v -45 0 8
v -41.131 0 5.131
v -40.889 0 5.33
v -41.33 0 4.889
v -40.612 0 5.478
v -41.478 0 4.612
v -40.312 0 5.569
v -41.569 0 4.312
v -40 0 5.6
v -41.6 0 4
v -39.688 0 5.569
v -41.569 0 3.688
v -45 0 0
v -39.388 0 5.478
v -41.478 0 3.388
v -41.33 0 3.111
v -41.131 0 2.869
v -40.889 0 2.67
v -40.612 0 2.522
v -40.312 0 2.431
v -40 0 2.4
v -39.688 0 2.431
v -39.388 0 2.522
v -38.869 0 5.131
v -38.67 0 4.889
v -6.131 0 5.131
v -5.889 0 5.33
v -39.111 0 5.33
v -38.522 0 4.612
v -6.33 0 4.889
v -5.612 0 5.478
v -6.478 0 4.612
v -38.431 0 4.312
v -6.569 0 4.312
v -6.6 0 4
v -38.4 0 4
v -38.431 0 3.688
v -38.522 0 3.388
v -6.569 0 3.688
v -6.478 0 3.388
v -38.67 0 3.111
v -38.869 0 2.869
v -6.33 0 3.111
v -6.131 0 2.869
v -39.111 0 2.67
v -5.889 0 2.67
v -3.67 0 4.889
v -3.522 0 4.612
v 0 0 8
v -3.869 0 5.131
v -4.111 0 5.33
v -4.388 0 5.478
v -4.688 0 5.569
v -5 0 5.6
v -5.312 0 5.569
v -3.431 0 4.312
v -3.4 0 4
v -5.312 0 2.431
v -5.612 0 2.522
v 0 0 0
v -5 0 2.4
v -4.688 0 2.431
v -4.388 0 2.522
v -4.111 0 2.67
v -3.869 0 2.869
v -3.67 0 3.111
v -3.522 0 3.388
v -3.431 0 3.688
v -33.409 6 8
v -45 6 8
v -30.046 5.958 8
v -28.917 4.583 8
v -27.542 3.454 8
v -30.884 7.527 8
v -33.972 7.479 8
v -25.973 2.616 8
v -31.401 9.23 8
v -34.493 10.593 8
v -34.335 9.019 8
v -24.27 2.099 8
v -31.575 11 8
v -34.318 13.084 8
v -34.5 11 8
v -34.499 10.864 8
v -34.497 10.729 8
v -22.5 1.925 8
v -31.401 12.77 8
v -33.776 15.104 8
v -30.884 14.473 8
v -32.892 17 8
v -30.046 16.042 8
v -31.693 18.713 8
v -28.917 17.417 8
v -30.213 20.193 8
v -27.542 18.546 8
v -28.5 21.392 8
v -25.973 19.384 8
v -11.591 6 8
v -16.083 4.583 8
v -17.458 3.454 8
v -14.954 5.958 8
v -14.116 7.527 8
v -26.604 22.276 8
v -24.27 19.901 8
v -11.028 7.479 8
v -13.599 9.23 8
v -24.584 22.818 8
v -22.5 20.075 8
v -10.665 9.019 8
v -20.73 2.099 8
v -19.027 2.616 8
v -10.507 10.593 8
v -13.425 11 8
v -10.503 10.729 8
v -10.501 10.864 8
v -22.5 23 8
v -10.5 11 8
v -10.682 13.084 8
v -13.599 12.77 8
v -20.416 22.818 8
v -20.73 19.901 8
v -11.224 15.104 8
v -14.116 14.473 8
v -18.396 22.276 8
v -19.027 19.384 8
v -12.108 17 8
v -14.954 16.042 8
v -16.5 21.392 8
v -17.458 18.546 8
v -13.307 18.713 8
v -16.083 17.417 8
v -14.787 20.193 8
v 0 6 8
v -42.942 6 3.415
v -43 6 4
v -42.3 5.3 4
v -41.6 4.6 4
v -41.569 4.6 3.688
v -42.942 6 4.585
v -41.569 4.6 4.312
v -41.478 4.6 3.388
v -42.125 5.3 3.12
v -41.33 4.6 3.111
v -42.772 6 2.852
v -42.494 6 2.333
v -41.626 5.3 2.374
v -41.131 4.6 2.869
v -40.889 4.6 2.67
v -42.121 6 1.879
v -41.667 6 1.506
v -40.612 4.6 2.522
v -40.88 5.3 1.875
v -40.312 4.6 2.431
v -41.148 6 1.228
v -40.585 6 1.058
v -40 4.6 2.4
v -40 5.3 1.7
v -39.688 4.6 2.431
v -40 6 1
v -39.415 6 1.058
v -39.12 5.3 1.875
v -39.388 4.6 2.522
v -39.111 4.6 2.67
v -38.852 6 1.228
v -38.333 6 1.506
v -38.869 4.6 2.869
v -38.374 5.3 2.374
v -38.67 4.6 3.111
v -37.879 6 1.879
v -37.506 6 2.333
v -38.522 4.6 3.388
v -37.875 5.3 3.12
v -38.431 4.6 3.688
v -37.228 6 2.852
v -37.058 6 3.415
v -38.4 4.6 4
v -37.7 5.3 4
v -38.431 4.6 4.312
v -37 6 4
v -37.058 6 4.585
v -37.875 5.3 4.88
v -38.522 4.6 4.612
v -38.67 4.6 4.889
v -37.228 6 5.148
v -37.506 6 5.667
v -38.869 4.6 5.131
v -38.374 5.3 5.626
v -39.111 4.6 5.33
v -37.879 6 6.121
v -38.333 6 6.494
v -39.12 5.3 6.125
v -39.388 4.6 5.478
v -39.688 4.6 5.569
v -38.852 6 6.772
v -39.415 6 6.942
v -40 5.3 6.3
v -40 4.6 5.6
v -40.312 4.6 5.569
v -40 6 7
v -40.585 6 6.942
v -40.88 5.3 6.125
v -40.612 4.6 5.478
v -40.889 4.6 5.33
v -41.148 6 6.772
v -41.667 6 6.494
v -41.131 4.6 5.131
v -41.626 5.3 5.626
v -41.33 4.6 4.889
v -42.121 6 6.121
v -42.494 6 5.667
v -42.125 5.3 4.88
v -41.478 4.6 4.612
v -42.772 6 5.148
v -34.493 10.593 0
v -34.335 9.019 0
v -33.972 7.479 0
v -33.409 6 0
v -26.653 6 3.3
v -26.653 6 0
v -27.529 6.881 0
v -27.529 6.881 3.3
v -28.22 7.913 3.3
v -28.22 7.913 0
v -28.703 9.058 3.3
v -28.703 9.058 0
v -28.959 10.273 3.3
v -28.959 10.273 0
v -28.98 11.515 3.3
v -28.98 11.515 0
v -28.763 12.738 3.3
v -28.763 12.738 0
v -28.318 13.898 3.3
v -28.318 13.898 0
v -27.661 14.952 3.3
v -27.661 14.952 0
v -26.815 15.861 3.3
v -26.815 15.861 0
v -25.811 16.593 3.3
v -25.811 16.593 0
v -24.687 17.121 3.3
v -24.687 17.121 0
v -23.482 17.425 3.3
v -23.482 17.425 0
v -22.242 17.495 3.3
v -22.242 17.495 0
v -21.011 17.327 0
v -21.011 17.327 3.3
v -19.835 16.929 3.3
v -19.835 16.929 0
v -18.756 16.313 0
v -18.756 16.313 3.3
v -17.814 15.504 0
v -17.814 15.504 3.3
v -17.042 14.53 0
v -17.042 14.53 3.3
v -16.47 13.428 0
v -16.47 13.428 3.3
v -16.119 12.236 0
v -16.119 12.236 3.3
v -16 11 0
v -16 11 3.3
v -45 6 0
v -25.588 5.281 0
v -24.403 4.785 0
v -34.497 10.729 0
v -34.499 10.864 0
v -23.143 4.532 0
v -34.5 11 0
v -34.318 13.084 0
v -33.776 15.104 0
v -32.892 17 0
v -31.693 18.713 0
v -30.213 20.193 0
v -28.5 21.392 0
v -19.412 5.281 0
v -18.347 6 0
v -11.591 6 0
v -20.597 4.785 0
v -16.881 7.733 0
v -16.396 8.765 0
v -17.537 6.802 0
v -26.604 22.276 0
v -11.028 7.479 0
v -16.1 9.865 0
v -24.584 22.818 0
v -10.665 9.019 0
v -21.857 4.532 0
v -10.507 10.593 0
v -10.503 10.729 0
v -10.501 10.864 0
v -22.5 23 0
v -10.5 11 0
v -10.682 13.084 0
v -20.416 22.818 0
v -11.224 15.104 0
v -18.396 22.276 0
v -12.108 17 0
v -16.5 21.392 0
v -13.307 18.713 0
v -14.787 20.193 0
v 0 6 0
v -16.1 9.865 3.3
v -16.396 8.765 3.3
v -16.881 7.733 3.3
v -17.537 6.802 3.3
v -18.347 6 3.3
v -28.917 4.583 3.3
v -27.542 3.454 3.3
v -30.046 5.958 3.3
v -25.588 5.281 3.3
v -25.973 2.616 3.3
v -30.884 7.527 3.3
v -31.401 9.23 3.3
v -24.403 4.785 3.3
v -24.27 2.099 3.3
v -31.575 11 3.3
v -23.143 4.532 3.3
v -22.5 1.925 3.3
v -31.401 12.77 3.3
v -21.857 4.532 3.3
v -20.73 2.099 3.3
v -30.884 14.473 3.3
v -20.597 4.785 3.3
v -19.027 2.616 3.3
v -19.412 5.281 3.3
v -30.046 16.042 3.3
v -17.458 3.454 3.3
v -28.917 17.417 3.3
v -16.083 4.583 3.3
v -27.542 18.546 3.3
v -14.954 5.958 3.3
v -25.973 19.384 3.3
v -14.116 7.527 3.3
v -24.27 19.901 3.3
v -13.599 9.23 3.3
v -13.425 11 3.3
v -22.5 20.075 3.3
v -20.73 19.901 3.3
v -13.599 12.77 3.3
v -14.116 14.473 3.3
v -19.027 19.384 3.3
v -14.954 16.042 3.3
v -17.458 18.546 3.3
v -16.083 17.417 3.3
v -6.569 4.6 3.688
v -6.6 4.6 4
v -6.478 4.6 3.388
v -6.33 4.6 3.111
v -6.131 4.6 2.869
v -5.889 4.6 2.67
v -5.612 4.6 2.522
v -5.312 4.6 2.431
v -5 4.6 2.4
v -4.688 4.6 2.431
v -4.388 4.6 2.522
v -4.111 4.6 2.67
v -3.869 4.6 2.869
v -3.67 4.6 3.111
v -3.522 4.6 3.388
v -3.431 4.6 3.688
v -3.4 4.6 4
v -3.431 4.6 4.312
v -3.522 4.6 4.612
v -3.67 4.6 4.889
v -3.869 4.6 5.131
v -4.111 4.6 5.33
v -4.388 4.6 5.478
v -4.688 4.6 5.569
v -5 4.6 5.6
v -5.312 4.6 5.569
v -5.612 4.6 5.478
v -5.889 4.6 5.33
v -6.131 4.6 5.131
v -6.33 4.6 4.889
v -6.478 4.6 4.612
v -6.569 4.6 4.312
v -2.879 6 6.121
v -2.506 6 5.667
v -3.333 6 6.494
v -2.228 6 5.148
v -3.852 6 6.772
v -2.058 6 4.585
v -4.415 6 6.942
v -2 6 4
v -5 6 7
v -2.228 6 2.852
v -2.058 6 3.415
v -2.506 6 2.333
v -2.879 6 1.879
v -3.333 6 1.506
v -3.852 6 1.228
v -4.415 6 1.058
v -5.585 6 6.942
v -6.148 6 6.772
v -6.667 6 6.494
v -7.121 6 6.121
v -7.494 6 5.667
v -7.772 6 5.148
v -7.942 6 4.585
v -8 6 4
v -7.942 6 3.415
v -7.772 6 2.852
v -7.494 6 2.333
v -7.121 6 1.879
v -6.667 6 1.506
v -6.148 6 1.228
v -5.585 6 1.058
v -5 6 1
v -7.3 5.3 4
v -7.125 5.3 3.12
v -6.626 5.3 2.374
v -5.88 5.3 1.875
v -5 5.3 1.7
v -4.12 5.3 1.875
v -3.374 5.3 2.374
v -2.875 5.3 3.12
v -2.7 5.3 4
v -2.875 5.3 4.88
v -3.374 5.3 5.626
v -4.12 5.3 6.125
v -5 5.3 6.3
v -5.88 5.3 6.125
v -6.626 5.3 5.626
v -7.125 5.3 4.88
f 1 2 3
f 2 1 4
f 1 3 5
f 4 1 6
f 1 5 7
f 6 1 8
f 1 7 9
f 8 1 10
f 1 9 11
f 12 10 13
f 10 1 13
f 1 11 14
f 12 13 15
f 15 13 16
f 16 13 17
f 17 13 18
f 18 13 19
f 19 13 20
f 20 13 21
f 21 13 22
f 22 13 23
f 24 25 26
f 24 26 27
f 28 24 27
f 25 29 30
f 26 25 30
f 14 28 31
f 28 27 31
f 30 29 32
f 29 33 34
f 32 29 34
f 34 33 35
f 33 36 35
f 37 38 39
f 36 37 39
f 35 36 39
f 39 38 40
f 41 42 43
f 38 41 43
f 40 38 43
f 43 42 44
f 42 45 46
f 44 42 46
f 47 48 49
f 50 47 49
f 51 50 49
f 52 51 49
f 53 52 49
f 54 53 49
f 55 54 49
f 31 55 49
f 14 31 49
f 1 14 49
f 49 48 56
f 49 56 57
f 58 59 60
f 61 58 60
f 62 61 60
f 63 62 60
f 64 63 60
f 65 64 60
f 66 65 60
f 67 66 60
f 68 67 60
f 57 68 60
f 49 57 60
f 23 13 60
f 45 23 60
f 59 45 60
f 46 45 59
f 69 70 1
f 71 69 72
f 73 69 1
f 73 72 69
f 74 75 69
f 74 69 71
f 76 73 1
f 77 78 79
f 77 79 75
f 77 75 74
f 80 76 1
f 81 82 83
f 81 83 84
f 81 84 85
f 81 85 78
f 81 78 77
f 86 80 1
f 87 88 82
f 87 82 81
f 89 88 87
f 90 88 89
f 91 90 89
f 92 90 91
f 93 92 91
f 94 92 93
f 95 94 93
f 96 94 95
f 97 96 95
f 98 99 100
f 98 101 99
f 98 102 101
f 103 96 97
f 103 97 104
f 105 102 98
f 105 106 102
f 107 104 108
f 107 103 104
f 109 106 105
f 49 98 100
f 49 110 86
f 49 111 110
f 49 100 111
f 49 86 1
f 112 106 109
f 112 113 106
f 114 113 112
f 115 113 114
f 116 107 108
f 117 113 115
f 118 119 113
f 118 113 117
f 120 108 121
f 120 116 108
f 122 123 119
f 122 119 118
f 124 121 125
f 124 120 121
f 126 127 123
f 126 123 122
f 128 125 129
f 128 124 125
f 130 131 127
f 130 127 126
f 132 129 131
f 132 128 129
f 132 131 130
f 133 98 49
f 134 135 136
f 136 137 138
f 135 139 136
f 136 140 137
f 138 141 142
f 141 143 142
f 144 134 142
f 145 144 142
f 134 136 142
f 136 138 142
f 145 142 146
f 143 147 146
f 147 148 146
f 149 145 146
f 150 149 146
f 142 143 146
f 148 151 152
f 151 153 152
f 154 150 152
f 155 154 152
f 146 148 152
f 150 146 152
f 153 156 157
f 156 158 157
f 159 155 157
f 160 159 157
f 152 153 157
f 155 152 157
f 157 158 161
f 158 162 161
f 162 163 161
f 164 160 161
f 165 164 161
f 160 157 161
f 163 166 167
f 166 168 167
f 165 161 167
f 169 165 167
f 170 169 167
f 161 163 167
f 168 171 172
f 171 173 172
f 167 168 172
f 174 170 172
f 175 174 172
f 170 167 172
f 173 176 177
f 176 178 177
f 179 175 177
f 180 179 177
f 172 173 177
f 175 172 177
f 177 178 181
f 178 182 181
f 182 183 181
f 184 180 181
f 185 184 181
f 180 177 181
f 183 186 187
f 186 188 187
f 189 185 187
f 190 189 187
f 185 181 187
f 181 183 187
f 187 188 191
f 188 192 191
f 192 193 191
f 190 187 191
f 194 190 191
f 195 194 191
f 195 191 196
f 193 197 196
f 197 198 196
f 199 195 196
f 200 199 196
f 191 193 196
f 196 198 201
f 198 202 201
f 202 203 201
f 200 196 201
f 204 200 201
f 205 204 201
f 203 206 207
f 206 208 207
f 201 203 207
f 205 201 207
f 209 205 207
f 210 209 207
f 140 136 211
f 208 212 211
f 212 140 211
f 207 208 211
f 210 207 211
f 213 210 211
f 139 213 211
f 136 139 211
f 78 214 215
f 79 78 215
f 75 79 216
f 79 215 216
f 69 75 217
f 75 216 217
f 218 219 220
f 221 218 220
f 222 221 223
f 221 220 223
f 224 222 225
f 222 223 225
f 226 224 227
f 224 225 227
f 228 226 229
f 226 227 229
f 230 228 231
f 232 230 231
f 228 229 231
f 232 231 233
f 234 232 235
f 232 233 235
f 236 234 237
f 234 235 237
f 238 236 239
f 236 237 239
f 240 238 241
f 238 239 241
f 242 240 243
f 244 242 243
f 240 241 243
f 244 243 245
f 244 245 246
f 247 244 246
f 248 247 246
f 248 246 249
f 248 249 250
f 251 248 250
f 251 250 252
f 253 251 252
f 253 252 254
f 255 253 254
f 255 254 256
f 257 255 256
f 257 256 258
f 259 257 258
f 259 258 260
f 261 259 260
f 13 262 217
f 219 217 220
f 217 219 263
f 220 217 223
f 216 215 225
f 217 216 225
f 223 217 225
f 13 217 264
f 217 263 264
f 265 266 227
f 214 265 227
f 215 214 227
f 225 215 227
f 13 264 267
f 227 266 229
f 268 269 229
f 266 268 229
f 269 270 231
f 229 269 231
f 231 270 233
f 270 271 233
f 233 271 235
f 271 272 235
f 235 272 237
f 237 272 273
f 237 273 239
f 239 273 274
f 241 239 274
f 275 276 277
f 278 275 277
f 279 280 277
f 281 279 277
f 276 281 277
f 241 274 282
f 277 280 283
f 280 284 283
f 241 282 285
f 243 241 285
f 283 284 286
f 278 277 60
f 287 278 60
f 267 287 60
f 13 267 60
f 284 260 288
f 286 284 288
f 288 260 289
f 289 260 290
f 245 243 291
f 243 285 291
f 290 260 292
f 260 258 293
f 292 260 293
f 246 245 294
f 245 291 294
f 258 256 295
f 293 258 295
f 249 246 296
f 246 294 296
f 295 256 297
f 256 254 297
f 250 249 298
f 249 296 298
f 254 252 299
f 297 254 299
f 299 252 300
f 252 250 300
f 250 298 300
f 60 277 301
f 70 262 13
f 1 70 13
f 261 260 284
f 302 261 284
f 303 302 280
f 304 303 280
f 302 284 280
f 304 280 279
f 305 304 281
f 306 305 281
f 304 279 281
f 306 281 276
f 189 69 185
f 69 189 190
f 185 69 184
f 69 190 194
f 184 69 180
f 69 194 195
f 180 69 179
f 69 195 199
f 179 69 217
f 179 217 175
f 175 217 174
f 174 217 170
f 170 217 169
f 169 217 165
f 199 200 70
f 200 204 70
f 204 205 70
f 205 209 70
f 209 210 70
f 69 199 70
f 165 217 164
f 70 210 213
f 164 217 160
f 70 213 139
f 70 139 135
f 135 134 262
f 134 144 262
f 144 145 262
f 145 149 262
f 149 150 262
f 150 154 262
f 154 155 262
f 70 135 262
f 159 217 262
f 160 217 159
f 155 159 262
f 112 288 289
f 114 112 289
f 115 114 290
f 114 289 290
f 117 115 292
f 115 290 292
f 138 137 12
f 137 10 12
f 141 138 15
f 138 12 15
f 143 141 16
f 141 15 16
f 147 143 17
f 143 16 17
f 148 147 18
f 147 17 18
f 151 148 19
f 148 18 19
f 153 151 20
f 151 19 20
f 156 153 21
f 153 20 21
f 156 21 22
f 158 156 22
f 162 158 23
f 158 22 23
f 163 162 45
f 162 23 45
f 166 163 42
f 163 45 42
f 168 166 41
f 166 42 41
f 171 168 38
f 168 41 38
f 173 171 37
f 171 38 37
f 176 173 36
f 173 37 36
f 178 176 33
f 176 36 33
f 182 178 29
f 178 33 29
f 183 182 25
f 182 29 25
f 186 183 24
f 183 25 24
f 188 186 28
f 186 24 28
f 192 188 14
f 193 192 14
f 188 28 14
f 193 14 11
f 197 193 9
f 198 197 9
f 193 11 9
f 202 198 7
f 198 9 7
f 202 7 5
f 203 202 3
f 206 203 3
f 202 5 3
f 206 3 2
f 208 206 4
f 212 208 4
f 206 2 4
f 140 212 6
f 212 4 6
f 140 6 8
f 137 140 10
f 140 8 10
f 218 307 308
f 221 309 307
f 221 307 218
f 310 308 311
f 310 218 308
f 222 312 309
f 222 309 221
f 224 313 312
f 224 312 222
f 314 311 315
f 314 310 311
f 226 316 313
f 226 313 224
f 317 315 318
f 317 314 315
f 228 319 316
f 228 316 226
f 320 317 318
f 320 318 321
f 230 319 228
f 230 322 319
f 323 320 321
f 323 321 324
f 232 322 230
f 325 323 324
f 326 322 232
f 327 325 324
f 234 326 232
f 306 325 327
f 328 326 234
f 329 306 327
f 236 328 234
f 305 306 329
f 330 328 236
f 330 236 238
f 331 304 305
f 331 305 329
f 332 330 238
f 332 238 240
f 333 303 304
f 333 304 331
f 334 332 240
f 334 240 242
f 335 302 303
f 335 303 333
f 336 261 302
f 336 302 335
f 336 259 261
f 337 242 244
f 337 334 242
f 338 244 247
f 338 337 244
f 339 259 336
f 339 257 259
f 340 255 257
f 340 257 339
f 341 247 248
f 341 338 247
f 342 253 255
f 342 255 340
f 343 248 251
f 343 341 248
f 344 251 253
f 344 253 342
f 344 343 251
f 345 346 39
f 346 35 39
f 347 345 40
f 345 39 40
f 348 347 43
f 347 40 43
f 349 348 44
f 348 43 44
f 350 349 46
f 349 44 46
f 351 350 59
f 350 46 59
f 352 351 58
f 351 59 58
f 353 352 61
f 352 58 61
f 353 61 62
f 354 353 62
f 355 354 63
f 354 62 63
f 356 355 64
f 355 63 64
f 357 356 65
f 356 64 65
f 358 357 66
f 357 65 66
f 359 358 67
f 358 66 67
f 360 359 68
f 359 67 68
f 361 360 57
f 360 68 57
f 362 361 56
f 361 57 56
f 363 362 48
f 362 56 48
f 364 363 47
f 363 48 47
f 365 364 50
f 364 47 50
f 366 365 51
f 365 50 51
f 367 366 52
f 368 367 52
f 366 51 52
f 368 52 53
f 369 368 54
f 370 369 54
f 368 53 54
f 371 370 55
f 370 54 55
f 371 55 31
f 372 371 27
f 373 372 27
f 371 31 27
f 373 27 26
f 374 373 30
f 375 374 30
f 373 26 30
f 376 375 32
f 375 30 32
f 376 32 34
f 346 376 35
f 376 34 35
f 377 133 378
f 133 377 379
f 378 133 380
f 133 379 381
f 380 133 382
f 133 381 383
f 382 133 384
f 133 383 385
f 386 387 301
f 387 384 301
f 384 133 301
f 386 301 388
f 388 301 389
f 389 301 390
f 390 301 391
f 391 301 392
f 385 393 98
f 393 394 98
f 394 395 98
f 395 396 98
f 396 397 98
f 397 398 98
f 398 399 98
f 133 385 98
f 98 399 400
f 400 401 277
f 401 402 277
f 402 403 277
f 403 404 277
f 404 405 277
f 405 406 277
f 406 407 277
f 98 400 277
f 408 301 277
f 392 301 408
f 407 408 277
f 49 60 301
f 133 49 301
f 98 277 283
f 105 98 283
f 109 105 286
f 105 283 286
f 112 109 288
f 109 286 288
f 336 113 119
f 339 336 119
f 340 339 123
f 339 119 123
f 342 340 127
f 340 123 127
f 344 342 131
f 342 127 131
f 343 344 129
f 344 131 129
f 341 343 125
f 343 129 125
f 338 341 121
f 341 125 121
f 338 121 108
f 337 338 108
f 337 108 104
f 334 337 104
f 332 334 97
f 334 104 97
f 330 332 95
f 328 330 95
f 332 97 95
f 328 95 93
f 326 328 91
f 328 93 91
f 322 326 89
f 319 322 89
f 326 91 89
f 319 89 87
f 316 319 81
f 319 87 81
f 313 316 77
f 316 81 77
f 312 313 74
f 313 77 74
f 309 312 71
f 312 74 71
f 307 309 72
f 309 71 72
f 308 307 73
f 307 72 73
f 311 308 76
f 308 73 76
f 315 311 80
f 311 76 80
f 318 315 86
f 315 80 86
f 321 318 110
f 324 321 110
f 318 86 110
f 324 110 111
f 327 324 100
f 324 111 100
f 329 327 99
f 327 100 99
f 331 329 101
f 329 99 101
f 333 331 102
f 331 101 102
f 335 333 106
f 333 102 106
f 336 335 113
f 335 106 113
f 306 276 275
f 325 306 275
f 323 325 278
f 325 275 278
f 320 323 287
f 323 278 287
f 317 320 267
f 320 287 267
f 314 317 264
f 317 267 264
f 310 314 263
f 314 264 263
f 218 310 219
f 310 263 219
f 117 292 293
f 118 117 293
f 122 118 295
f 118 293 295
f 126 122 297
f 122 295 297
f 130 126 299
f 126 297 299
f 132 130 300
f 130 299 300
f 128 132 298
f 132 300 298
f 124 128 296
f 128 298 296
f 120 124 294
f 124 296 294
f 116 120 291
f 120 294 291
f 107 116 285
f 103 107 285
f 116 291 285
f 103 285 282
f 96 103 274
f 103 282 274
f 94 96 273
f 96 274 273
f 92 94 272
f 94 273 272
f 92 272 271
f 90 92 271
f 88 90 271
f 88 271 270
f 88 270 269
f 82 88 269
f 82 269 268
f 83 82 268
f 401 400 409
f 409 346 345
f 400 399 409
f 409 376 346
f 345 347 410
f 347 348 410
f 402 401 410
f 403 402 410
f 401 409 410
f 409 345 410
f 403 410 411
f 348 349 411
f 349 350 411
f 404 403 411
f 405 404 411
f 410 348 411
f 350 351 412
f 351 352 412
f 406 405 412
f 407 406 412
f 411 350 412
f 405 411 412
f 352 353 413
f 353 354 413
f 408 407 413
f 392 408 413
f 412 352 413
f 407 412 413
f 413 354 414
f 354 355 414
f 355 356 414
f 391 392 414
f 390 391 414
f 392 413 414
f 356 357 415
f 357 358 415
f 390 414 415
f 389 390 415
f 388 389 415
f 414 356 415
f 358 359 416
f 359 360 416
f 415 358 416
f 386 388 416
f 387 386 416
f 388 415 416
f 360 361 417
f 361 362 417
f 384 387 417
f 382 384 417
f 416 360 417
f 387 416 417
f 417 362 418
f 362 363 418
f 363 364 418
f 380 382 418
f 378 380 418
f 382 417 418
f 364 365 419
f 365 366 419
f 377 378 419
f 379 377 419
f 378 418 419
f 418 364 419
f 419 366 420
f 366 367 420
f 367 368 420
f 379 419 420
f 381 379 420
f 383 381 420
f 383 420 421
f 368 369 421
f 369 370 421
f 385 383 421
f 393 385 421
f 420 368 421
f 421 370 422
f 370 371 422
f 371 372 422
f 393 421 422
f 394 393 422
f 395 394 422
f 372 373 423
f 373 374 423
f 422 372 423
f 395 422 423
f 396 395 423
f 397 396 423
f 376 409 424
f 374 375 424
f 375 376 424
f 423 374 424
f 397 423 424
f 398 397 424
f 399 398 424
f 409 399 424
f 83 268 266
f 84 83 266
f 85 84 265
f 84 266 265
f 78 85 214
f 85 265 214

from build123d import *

# Parameters (mm, degrees)
BOSS_EXTRUDE1_DEPTH = 8
SKETCH2_R           = 9.075
CUT_EXTRUDE1_DEPTH  = 4.7
HOLE1_D             = 3.2
HOLE1_CSINK_D       = 6
HOLE1_CSINK_ANGLE   = 90


with BuildPart() as part:
    # Sketch1 → Boss-Extrude1 (new body)
    with BuildSketch(Plane.XY):
        with BuildLine():
            Line((-27.295831523, 0), (-17.704168477, 0))
            ThreePointArc((-17.704168477, 0), (-14.094158417, 2.436015689), (-11.591287885, 6))
            Line((-11.591287885, 6), (-18.346688069, 6))
            ThreePointArc((-18.346688069, 6), (-22.5, 4.5), (-26.653311931, 6))
            Line((-26.653311931, 6), (-33.408712115, 6))
            ThreePointArc((-33.408712115, 6), (-30.905841583, 2.436015689), (-27.295831523, 0))
        make_face()
        with BuildLine():
            Line((-45, 0), (-27.295831523, 0))
            ThreePointArc((-27.295831523, 0), (-30.905841583, 2.436015689), (-33.408712115, 6))
            Line((-33.408712115, 6), (-36, 6))
            Line((-36, 6), (-45, 6))
            Line((-45, 6), (-45, 0))
        make_face()
        with BuildLine():
            Line((-18.346688069, 6), (-11.591287885, 6))
            ThreePointArc((-11.591287885, 6), (-10.82107856, 8.242683552), (-10.506902886, 10.593033646))
            add(Edge.make_bspline(
                [(-10.506902886, 10.593033646), (-10.587978043, 10.993773754), (-10.5, 11)],
                knots=[0.717855618, 0.717855618, 0.717855618, 1, 1, 1], degree=2))
            ThreePointArc((-10.5, 11), (-22.5, 23), (-34.5, 11))
            add(Edge.make_bspline(
                [(-34.493097114, 10.593033646), (-34.412021957, 10.993773754), (-34.5, 11)],
                knots=[0.717855618, 0.717855618, 0.717855618, 1, 1, 1], degree=2))
            ThreePointArc((-34.493097114, 10.593033646), (-34.17892144, 8.242683552), (-33.408712115, 6))
            Line((-33.408712115, 6), (-26.653311931, 6))
            ThreePointArc((-26.653311931, 6), (-25.261654617, 16.884153616), (-16, 11))
            ThreePointArc((-16, 11), (-16.615846384, 8.238345383), (-18.346688069, 6))
        make_face()
        with BuildLine():
            Line((-17.704168477, 0), (0, 0))
            Line((0, 0), (0, 6))
            Line((0, 6), (-9, 6))
            Line((-9, 6), (-11.591287885, 6))
            ThreePointArc((-11.591287885, 6), (-14.094158417, 2.436015689), (-17.704168477, 0))
        make_face()
        with BuildLine():
            ThreePointArc((-34.5, 11), (-34.498274154, 10.796487554), (-34.493097114, 10.593033646))
            add(Edge.make_bspline(
                [(-34.493097114, 10.593033646), (-34.412021957, 10.993773754), (-34.5, 11)],
                knots=[0.717855618, 0.717855618, 0.717855618, 1, 1, 1], degree=2))
        make_face()
        with BuildLine():
            add(Edge.make_bspline(
                [(-10.506902886, 10.593033646), (-10.587978043, 10.993773754), (-10.5, 11)],
                knots=[0.717855618, 0.717855618, 0.717855618, 1, 1, 1], degree=2))
            ThreePointArc((-10.506902886, 10.593033646), (-10.501725846, 10.796487554), (-10.5, 11))
        make_face()
    extrude(amount=BOSS_EXTRUDE1_DEPTH)

    # Sketch2 → Cut-Extrude1 (cut)
    with BuildSketch(Plane.XY.offset(8)):
        with Locations((-22.5, 11)):
            Circle(SKETCH2_R)
    extrude(amount=-CUT_EXTRUDE1_DEPTH, mode=Mode.SUBTRACT)

    # Hole1 (through all)
    with Locations(Plane(origin=(-40, 6, 4), x_dir=(1, 0, 0), z_dir=(0, 1, 0))):
        with Locations((0, 0), (35, 0)):
            CounterSinkHole(HOLE1_D / 2, HOLE1_CSINK_D / 2, counter_sink_angle=HOLE1_CSINK_ANGLE)


solid = part.part
